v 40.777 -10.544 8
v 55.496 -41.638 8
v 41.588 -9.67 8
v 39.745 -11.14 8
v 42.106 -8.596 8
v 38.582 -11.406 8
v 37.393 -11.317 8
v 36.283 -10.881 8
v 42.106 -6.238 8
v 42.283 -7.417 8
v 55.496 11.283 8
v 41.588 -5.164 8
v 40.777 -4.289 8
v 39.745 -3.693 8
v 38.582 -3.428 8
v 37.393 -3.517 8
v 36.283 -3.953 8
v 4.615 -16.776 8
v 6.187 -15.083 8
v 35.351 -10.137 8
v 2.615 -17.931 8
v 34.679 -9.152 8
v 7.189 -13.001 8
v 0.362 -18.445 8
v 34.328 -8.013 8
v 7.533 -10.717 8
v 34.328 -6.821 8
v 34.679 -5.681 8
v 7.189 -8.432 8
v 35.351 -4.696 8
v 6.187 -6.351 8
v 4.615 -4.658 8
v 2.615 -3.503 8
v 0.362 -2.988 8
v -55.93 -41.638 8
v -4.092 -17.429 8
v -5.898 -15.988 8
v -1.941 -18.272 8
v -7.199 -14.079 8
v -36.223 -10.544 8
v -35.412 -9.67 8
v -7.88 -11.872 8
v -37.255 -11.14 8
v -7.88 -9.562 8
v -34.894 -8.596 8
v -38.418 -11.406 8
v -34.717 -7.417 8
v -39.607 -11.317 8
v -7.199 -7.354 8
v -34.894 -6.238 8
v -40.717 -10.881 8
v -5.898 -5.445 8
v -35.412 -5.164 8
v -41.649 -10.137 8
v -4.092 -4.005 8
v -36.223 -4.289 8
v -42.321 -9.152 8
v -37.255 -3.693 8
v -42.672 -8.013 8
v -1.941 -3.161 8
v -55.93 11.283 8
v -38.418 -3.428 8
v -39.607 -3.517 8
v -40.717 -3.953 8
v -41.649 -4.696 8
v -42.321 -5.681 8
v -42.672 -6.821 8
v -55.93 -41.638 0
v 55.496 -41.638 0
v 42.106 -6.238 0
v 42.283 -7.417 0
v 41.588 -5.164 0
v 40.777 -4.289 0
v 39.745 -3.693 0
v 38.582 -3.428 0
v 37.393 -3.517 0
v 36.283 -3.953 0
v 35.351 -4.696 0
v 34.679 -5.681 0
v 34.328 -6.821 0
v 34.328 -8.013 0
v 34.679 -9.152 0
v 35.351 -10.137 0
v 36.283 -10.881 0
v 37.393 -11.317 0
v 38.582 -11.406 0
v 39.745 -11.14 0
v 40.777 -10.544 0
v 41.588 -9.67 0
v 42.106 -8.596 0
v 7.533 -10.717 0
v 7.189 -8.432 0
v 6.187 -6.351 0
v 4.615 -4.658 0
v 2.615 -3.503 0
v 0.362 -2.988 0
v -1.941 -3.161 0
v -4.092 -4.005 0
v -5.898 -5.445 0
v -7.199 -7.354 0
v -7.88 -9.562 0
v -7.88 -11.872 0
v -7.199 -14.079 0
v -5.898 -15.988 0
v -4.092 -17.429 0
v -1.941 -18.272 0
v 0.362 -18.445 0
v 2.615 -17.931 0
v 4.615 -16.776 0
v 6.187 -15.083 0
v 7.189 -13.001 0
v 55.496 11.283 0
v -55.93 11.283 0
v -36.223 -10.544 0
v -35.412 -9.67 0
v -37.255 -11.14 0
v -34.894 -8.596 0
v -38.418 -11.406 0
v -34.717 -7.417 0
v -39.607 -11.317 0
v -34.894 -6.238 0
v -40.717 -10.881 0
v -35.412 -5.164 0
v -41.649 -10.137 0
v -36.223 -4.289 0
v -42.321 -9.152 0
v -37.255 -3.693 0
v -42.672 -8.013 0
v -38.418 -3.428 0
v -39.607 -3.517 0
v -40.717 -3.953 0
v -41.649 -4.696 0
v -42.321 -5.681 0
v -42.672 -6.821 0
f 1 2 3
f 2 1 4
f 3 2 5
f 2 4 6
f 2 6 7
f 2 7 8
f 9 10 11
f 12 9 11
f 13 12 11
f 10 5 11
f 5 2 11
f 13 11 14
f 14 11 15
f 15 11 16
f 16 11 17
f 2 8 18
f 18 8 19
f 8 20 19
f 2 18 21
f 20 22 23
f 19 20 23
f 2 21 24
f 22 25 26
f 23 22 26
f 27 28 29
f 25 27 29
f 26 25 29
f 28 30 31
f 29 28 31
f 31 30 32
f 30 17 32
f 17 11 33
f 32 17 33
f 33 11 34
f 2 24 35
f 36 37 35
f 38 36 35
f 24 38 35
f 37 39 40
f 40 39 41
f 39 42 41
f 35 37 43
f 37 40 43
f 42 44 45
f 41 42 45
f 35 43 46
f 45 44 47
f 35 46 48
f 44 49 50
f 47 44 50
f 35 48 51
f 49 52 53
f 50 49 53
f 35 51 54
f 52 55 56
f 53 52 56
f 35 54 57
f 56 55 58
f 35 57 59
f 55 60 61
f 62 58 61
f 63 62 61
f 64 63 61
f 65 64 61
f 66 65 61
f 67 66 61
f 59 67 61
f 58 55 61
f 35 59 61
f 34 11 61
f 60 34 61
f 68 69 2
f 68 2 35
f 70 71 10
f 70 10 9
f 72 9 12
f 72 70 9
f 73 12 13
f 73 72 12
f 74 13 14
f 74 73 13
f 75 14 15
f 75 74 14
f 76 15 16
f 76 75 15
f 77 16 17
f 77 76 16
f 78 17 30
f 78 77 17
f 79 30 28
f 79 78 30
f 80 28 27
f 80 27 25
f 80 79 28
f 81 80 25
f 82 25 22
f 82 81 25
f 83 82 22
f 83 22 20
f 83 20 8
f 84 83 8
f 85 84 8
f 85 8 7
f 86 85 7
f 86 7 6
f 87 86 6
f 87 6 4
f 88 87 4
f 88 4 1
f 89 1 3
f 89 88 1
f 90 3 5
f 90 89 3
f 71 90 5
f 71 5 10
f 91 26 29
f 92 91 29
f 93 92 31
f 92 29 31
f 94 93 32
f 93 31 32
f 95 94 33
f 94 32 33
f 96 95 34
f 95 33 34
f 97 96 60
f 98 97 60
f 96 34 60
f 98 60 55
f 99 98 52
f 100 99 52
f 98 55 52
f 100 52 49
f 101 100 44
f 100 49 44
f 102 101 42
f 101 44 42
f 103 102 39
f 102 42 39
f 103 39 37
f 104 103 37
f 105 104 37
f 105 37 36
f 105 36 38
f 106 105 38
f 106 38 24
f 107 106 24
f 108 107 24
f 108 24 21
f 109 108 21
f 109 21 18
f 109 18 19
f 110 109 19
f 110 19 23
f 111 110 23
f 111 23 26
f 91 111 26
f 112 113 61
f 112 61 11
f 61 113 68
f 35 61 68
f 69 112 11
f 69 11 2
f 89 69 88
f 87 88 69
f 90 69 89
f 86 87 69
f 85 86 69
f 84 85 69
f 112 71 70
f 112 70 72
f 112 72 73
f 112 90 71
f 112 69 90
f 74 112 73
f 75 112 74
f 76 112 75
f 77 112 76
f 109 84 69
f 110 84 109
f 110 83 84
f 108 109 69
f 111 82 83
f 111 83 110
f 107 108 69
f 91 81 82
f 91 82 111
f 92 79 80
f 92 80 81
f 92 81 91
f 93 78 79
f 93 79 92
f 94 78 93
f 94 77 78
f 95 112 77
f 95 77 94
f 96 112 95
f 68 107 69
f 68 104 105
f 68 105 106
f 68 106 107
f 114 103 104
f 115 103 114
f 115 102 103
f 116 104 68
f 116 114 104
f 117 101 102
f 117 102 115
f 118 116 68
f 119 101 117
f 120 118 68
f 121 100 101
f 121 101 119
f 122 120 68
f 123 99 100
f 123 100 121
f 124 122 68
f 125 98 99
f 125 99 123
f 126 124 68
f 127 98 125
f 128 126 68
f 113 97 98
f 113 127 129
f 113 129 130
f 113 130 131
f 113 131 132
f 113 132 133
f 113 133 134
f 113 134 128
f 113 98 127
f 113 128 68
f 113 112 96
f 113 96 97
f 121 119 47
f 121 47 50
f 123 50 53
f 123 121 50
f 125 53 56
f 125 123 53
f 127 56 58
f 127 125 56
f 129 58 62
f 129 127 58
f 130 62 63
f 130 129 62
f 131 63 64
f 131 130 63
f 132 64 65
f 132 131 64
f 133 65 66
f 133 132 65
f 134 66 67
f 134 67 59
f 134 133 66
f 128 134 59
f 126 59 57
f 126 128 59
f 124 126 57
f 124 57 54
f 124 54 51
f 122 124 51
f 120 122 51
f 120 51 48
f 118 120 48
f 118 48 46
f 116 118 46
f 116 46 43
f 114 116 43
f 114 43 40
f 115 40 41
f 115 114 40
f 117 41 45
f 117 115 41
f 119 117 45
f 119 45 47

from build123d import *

# Parameters (mm, degrees)
SKETCH1_R           = 4
SKETCH1_R_2         = 5
BOSS_EXTRUDE1_DEPTH = 8
SKETCH2_R           = 7.75
CUT_EXTRUDE1_DEPTH  = 9


with BuildPart() as part:
    # Sketch1 → Boss-Extrude1 (new body)
    with BuildSketch(Plane.XY):
        Polygon((-55.929590299, 11.283196531), (55.49624814, 11.283196531), (55.49624814, -41.637870342), (-55.929590299, -41.637870342), (-55.929590299, -36.557898132), align=None)
        with Locations((38.28332892, -7.416803469)):
            Circle(SKETCH1_R, mode=Mode.SUBTRACT)
        with Locations((-0.21667108, -10.716803469)):
            Circle(SKETCH1_R_2, mode=Mode.SUBTRACT)
        with Locations((-38.71667108, -7.416803469)):
            Circle(SKETCH1_R, mode=Mode.SUBTRACT)
    extrude(amount=BOSS_EXTRUDE1_DEPTH)

    # Sketch2 → Cut-Extrude1 (cut, through all)
    with BuildSketch(Plane.XY.offset(8)):
        with Locations((-0.21667108, -10.716803469)):
            Circle(SKETCH2_R)
    extrude(amount=-CUT_EXTRUDE1_DEPTH, mode=Mode.SUBTRACT)


solid = part.part
